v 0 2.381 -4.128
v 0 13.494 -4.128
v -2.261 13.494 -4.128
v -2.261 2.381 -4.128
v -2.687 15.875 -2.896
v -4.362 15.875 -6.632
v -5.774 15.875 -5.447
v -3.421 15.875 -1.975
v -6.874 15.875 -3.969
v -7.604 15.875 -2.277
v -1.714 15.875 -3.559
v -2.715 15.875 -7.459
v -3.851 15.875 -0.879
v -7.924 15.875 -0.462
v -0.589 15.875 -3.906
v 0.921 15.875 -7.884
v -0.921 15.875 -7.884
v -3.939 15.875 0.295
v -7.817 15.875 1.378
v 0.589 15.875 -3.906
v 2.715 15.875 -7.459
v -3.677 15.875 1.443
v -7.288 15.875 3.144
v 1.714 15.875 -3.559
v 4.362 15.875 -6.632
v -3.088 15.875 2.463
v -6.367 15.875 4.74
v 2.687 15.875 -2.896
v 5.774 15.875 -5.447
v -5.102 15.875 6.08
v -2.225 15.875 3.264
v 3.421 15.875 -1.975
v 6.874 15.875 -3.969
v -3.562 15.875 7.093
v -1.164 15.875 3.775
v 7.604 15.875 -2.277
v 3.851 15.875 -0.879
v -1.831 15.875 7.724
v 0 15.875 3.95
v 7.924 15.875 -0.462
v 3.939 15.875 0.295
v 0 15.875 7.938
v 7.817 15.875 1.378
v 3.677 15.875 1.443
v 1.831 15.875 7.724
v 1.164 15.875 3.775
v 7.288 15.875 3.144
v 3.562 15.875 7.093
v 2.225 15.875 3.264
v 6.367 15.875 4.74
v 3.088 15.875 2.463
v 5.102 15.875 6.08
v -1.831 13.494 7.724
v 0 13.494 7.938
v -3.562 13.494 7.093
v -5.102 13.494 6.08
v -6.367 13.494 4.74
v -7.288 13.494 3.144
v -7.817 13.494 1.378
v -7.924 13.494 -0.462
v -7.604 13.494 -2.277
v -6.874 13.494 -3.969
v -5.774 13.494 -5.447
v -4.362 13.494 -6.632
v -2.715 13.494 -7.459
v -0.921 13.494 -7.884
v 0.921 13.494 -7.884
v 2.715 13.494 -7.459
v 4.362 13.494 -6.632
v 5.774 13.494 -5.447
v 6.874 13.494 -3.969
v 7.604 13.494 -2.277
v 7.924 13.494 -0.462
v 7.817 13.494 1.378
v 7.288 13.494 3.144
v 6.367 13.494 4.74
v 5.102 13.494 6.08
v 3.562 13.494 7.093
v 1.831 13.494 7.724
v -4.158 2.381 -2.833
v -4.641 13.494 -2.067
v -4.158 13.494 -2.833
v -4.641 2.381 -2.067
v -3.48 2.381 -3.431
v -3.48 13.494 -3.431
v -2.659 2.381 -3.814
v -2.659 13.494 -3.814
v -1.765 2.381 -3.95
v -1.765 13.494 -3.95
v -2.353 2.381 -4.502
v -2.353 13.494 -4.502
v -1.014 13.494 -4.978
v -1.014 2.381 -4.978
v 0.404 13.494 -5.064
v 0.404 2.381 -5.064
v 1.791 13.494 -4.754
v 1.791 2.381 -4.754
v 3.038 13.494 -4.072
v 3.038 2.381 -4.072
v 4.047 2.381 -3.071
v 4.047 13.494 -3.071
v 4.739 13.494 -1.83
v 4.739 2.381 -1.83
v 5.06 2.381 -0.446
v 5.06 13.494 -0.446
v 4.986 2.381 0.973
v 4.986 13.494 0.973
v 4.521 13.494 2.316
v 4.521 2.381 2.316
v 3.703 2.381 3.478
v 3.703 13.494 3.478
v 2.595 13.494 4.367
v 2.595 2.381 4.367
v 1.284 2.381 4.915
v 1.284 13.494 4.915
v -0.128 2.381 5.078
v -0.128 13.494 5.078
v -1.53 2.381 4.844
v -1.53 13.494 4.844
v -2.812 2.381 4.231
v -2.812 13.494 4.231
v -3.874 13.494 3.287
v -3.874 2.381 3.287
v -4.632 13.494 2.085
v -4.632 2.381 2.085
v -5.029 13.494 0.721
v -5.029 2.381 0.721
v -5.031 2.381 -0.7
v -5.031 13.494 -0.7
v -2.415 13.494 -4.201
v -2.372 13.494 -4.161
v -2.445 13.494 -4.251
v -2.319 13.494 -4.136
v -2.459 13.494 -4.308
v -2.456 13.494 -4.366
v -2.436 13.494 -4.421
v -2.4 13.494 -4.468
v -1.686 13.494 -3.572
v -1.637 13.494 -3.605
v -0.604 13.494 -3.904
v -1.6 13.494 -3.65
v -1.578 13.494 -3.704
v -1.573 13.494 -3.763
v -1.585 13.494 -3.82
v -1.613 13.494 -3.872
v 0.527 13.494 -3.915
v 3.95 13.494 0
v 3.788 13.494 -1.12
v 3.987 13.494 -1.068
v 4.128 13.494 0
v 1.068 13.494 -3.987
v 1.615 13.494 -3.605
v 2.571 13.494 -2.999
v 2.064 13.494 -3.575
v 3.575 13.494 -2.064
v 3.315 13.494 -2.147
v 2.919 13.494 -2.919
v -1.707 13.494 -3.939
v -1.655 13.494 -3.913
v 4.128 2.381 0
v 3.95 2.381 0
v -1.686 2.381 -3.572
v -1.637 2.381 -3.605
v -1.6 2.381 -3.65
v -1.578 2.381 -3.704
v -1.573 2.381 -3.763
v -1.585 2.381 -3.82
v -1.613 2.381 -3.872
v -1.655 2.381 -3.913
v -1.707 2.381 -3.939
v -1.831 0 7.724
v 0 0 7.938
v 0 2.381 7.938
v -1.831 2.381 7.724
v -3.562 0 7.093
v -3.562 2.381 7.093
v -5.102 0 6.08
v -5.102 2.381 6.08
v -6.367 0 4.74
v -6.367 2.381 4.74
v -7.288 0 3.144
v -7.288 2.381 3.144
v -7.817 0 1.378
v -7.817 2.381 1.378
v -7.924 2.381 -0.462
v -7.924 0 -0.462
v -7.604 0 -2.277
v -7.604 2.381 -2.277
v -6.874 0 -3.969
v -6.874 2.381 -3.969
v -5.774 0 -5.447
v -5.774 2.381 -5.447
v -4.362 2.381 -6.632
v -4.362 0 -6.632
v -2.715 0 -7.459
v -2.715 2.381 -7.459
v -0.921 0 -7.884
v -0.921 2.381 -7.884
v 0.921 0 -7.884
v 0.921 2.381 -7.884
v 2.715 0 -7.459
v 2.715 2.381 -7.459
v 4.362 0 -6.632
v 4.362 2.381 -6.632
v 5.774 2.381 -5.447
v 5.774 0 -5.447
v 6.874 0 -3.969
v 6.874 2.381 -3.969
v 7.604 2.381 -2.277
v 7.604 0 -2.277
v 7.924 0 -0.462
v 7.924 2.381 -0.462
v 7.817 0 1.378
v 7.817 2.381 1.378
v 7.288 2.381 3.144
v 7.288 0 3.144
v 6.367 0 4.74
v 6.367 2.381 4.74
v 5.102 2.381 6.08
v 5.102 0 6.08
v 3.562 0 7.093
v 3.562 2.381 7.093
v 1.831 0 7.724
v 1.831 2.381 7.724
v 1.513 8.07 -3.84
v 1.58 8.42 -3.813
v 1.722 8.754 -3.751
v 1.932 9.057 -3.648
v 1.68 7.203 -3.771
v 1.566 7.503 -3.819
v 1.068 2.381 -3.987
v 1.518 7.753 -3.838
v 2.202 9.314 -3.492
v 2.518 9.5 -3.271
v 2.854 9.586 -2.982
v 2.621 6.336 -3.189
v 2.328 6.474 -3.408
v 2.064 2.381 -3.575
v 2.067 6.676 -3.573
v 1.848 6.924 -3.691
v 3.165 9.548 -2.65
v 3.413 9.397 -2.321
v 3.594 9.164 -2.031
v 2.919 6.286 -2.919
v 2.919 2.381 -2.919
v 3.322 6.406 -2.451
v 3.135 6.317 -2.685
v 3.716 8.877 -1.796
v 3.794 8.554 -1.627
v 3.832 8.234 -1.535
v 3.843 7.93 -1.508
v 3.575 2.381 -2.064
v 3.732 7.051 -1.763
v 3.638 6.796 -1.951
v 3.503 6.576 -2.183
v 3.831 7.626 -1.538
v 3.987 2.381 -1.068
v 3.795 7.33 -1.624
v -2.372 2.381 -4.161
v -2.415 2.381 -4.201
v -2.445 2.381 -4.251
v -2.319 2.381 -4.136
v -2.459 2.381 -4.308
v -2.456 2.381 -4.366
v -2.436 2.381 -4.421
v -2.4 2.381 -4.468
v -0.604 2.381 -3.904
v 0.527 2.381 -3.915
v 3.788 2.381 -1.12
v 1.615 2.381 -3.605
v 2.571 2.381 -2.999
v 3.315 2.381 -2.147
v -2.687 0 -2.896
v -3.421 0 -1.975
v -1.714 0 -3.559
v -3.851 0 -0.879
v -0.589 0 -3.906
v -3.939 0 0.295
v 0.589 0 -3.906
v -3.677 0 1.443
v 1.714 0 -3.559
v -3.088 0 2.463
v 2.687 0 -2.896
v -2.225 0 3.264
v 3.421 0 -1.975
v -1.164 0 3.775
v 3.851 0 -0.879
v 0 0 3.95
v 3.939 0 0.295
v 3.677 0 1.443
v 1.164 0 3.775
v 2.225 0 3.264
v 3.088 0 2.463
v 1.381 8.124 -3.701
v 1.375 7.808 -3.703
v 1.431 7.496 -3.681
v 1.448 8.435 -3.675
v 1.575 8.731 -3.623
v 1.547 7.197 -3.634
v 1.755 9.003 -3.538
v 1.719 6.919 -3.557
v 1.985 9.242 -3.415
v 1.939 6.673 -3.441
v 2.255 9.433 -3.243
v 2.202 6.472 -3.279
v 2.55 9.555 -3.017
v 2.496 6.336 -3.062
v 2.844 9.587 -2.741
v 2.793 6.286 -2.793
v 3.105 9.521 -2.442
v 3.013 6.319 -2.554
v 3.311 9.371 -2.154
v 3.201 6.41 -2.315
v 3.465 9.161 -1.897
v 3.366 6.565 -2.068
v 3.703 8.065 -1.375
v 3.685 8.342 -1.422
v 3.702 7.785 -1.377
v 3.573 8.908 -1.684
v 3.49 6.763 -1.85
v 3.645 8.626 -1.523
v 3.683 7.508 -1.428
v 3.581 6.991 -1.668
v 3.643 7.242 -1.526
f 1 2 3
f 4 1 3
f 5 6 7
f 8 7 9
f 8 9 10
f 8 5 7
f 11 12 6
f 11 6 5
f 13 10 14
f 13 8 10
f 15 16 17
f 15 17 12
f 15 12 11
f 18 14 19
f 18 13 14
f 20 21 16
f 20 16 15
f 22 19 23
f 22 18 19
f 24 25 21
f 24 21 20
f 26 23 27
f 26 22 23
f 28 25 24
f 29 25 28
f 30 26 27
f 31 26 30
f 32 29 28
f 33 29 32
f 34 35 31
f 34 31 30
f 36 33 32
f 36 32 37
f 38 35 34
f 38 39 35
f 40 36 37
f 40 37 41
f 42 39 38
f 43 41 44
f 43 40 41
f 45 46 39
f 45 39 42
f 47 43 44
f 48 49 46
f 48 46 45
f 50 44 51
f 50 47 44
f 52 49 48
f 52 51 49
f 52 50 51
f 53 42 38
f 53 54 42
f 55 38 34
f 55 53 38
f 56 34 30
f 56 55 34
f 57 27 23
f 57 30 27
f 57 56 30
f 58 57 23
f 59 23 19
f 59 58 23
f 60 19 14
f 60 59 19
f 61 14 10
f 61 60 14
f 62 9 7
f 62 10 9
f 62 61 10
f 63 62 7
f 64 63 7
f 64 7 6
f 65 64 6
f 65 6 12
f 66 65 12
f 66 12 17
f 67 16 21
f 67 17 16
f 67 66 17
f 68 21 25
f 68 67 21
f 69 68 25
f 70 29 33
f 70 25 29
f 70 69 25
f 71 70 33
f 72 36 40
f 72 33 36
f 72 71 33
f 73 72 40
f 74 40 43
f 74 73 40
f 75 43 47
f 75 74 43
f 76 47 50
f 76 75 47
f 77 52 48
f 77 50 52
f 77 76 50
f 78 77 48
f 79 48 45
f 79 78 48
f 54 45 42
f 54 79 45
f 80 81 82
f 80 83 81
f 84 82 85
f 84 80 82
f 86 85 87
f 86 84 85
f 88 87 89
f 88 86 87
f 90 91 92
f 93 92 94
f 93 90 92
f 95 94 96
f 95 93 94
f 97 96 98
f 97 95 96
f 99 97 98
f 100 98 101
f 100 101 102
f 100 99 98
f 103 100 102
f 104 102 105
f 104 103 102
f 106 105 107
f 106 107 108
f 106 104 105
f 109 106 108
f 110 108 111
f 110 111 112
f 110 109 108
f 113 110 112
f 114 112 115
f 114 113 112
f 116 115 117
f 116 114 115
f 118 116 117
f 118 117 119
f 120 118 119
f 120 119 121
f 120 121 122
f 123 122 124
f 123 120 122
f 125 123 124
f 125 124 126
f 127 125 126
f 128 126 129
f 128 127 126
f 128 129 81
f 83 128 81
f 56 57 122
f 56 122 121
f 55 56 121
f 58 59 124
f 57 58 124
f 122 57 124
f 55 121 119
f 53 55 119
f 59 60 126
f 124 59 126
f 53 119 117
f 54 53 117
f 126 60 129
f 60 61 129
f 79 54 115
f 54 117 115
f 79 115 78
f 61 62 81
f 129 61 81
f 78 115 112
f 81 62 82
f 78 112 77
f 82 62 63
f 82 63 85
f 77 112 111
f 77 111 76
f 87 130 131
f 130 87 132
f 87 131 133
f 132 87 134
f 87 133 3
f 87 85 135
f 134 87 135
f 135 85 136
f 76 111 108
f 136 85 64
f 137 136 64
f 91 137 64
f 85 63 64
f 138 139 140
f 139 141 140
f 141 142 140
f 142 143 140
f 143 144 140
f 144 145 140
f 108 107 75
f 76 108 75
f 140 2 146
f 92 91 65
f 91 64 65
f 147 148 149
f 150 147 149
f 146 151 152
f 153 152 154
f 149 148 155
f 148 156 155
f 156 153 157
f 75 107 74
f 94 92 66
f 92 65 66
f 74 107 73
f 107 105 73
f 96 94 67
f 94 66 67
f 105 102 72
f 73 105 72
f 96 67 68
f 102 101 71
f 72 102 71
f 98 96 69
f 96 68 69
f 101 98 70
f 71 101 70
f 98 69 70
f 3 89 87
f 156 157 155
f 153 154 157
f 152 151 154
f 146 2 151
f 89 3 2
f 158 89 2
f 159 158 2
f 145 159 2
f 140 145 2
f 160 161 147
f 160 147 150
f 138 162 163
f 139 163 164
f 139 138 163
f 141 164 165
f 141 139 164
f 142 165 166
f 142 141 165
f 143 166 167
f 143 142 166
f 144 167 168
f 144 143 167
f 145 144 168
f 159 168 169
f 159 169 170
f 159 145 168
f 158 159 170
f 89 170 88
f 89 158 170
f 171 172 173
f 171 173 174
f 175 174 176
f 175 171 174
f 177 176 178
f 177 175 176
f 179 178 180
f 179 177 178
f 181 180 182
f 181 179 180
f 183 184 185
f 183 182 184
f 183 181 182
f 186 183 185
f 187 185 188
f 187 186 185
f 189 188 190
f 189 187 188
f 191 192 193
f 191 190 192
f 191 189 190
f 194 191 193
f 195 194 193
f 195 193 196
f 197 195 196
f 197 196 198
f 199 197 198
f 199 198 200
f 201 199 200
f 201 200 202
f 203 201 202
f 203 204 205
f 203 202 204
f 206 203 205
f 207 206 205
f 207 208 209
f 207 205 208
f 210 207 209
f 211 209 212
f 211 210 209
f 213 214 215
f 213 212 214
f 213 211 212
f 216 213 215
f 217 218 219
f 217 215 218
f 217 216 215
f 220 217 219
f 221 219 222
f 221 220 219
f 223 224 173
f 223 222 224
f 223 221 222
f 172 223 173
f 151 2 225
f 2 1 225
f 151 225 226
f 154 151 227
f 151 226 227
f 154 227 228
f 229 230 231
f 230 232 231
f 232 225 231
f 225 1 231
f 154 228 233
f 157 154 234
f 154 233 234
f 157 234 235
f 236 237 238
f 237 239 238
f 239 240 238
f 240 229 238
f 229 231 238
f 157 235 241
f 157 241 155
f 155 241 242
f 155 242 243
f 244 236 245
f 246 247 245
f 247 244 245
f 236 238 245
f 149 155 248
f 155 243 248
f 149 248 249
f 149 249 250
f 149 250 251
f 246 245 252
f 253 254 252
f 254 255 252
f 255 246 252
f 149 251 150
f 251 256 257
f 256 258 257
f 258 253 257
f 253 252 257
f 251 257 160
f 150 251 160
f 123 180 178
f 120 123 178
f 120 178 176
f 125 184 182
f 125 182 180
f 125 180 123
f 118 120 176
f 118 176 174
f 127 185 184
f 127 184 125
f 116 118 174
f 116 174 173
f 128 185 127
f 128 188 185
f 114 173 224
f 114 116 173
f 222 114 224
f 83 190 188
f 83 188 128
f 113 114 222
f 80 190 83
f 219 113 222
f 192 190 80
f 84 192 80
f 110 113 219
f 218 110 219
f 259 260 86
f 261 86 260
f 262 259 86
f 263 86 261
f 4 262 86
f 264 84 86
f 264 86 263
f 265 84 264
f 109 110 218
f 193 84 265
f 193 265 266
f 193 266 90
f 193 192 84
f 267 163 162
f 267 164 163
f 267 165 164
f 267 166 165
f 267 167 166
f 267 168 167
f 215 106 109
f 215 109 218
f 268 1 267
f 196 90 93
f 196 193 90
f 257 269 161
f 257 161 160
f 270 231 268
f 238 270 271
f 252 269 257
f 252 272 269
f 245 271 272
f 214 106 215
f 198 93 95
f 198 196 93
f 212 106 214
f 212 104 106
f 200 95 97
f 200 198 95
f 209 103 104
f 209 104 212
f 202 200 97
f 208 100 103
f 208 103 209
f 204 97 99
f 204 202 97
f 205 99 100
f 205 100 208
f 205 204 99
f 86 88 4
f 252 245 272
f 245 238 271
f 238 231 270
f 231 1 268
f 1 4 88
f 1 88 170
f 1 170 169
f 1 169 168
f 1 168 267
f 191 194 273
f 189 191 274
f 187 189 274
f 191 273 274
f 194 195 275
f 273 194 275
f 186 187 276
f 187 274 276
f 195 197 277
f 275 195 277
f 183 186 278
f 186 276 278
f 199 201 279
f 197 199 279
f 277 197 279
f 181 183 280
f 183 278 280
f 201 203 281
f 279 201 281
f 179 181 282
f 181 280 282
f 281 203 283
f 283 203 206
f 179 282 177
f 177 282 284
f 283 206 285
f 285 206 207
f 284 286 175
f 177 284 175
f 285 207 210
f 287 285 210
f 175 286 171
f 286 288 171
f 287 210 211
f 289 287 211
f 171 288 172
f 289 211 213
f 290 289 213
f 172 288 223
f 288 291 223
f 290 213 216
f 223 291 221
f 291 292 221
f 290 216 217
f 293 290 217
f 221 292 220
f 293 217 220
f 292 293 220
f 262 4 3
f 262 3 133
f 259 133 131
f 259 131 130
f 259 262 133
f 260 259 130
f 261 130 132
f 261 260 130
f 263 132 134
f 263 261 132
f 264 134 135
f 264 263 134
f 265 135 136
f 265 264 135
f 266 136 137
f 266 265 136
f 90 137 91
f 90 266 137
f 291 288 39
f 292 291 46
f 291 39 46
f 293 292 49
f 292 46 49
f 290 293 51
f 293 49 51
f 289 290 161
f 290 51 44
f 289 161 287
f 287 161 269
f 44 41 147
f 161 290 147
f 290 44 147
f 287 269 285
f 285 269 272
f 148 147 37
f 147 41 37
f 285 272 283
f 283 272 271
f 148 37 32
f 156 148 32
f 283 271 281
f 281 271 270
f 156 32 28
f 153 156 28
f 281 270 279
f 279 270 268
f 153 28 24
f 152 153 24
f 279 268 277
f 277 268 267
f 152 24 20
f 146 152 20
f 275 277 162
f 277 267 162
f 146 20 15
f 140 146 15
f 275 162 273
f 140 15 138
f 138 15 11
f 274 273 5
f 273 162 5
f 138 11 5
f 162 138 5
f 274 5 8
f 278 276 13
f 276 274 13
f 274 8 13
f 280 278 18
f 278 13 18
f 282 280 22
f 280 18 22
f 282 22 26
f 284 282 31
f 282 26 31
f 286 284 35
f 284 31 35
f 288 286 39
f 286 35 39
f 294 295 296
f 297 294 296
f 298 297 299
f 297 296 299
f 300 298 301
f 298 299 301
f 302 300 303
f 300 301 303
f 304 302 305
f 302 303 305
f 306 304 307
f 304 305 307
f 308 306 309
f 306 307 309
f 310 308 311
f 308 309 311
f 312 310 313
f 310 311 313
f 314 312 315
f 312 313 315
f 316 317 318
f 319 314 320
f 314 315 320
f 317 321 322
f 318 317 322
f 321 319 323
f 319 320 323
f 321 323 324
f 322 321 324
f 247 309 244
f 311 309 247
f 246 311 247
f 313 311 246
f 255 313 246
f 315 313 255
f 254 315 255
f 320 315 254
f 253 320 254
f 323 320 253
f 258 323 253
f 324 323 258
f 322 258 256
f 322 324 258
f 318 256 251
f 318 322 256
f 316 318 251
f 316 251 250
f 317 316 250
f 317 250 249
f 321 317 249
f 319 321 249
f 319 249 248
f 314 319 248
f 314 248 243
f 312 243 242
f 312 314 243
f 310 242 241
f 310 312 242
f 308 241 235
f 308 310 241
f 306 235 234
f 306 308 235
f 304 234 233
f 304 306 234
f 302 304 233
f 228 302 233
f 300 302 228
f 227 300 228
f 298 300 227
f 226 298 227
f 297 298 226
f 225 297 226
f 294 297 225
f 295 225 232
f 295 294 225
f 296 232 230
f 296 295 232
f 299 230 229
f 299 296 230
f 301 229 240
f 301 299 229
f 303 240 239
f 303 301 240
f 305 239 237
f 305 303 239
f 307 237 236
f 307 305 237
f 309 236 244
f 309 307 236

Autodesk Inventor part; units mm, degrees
ref_plane "YZ Plane" through (0, 0, 0) normal (1, 0, 0) x (0, 1, 0)
ref_plane "XZ Plane" through (0, 0, 0) normal (0, 1, 0) x (-1, 0, 0)
ref_plane "XY Plane" through (0, 0, 0) normal (0, 0, 1) x (1, 0, 0)
sketch "Sketch1" plane through (0, 0, 0) normal (1, 0, 0) x (0, 1, 0)
  line L0 (0, 0) -> (15.875, 0)
  line L1 (15.875, 0) -> (15.875, 5.08)
  line L2 (15.875, 5.08) -> (0, 5.08)
  line L3 (0, 5.08) -> (0, 0)
  line L4 (15.875, 5.08) -> (13.49375, 5.08)
  line L5 (13.49375, 5.08) -> (13.49375, 7.9375)
  line L6 (13.49375, 7.9375) -> (15.875, 7.9375)
  line L7 (15.875, 7.9375) -> (15.875, 5.08)
  line L8 (0, 5.08) -> (2.38125, 5.08)
  line L9 (2.38125, 5.08) -> (2.38125, 7.9375)
  line L10 (2.38125, 7.9375) -> (0, 7.9375)
  line L11 (0, 7.9375) -> (0, 5.08)
  line L12 (15.875, 3.95) -> (0, 3.95)
  line L13 (0, 3.95) -> (0, 0)
  line L14 (0, 0) -> (15.875, 0)
  line L15 (15.875, 0) -> (15.875, 3.95)
  point P0 (0, 3.95)
  dimension "d0" = 15.875
  dimension "d1" = 5.08
  dimension "d2" = 2.38125
  dimension "d3" = 2.38125
  dimension "d4" = 7.9375
  dimension "d5" = 3.95
sketch "Sketch1 outline for Revolution1" plane through (0, 0, 0) normal (1, 0, 0) x (0, 1, 0)
  line L0 (15.875, 5.08) -> (15.875, 7.9375)
  line L1 (15.875, 3.95) -> (15.875, 5.08)
  line L2 (0, 3.95) -> (15.875, 3.95)
  line L3 (0, 5.08) -> (0, 3.95)
  line L4 (0, 7.9375) -> (0, 5.08)
  line L5 (2.38125, 7.9375) -> (0, 7.9375)
  line L6 (2.38125, 5.08) -> (2.38125, 7.9375)
  line L7 (13.49375, 5.08) -> (2.38125, 5.08)
  line L8 (13.49375, 7.9375) -> (13.49375, 5.08)
  line L9 (15.875, 7.9375) -> (13.49375, 7.9375)
revolve "Revolution1" add sketch "Sketch1 outline for Revolution1" angle 360 about axis through (0, 0, 0) along (0, 1, 0)
sketch "Sketch2" plane through (0, 2.38125, 0) normal (0, 1, 0) x (1, 0, 0)
  circle A0 centre (0, 0) radius 3.95
  circle A1 centre (0, 0) radius 4.1278
  line L0 (3.95, 0) -> (4.1278, 0)
  line L1 (0, 3.95) -> (0, 4.1278)
  circle A2 centre (0, 0) radius 5.08
  line L2 (0, 4.1278) -> (-3.194354, 4.1278)
  line L3 (-3.194354, 4.1278) -> (-3.194354, 3.95)
  line L4 (-3.194354, 3.95) -> (0, 3.95)
  line L5 (0, 3.95) -> (0, 4.1278)
  point P0 (0, 0)
  dimension "d7" = 0.1778
sketch "Sketch2 outline for Extrusion1" plane through (0, 2.38125, 0) normal (0, 1, 0) x (1, 0, 0)
  line L0 (-3.194354, 3.95) -> (0, 3.95)
  line L1 (-3.194354, 4.1278) -> (-3.194354, 3.95)
  line L2 (0, 4.1278) -> (-3.194354, 4.1278)
  arc A0 (4.1278, 0) -> (0, 4.1278) centre (0, 0) ccw
  line L3 (3.95, 0) -> (4.1278, 0)
  arc A1 (0, 3.95) -> (3.95, 0) centre (0, 0) cw
extrude "Extrusion1" cut sketch "Sketch2 outline for Extrusion1" along normal up to surface (11.1125 mm away)
ref_plane "Work Plane1" through (3.95, 7.9375, 0) normal (0.7071068, 0, -0.7071068) x (0, -1, 0)
sketch "Sketch3" plane through (3.95, 7.9375, 0) normal (0.7071068, 0, -0.7071068) x (0, -1, 0)
  line L0 (7.9375, 2.793072) -> (-7.9375, 2.793072) construction
  line L1 (-7.9375, 6.743072) -> (-7.9375, -1.156928)
  circle A0 centre (0, 2.793072) radius 1.651
  dimension "d12" = 3.302
sketch "Sketch3 outline for Extrusion2" plane through (3.95, 7.9375, 0) normal (0.7071068, 0, -0.7071068) x (0, -1, 0)
  circle A0 centre (0, 2.793072) radius 1.651
extrude "Extrusion2" add sketch "Sketch3 outline for Extrusion2" along normal blind 1.5875
sketch "Sketch4" plane through (0, 0, 0) normal (0, -1, 0) x (1, 0, 0)
  circle A0 centre (0, 0) radius 3.95 projected
  point P0 (0, 0)
sketch "Sketch4 outline for Extrusion3" plane through (0, 0, 0) normal (0, -1, 0) x (1, 0, 0)
  circle A0 centre (0, 0) radius 3.95
extrude "Extrusion3" cut sketch "Sketch4 outline for Extrusion3" against normal through all
fillet "Fillet1" radius 0.198437 2 edges at (0, 7.9375, -3.95) (-2.961, 7.9375, -4.1278)
fillet "Fillet2" radius 3.175 1 edges at (-3.1944, 7.9375, -3.95)
equation "\"d3\" = d2"
properties part number "Spring Spool" material "Nylon 6/6"
